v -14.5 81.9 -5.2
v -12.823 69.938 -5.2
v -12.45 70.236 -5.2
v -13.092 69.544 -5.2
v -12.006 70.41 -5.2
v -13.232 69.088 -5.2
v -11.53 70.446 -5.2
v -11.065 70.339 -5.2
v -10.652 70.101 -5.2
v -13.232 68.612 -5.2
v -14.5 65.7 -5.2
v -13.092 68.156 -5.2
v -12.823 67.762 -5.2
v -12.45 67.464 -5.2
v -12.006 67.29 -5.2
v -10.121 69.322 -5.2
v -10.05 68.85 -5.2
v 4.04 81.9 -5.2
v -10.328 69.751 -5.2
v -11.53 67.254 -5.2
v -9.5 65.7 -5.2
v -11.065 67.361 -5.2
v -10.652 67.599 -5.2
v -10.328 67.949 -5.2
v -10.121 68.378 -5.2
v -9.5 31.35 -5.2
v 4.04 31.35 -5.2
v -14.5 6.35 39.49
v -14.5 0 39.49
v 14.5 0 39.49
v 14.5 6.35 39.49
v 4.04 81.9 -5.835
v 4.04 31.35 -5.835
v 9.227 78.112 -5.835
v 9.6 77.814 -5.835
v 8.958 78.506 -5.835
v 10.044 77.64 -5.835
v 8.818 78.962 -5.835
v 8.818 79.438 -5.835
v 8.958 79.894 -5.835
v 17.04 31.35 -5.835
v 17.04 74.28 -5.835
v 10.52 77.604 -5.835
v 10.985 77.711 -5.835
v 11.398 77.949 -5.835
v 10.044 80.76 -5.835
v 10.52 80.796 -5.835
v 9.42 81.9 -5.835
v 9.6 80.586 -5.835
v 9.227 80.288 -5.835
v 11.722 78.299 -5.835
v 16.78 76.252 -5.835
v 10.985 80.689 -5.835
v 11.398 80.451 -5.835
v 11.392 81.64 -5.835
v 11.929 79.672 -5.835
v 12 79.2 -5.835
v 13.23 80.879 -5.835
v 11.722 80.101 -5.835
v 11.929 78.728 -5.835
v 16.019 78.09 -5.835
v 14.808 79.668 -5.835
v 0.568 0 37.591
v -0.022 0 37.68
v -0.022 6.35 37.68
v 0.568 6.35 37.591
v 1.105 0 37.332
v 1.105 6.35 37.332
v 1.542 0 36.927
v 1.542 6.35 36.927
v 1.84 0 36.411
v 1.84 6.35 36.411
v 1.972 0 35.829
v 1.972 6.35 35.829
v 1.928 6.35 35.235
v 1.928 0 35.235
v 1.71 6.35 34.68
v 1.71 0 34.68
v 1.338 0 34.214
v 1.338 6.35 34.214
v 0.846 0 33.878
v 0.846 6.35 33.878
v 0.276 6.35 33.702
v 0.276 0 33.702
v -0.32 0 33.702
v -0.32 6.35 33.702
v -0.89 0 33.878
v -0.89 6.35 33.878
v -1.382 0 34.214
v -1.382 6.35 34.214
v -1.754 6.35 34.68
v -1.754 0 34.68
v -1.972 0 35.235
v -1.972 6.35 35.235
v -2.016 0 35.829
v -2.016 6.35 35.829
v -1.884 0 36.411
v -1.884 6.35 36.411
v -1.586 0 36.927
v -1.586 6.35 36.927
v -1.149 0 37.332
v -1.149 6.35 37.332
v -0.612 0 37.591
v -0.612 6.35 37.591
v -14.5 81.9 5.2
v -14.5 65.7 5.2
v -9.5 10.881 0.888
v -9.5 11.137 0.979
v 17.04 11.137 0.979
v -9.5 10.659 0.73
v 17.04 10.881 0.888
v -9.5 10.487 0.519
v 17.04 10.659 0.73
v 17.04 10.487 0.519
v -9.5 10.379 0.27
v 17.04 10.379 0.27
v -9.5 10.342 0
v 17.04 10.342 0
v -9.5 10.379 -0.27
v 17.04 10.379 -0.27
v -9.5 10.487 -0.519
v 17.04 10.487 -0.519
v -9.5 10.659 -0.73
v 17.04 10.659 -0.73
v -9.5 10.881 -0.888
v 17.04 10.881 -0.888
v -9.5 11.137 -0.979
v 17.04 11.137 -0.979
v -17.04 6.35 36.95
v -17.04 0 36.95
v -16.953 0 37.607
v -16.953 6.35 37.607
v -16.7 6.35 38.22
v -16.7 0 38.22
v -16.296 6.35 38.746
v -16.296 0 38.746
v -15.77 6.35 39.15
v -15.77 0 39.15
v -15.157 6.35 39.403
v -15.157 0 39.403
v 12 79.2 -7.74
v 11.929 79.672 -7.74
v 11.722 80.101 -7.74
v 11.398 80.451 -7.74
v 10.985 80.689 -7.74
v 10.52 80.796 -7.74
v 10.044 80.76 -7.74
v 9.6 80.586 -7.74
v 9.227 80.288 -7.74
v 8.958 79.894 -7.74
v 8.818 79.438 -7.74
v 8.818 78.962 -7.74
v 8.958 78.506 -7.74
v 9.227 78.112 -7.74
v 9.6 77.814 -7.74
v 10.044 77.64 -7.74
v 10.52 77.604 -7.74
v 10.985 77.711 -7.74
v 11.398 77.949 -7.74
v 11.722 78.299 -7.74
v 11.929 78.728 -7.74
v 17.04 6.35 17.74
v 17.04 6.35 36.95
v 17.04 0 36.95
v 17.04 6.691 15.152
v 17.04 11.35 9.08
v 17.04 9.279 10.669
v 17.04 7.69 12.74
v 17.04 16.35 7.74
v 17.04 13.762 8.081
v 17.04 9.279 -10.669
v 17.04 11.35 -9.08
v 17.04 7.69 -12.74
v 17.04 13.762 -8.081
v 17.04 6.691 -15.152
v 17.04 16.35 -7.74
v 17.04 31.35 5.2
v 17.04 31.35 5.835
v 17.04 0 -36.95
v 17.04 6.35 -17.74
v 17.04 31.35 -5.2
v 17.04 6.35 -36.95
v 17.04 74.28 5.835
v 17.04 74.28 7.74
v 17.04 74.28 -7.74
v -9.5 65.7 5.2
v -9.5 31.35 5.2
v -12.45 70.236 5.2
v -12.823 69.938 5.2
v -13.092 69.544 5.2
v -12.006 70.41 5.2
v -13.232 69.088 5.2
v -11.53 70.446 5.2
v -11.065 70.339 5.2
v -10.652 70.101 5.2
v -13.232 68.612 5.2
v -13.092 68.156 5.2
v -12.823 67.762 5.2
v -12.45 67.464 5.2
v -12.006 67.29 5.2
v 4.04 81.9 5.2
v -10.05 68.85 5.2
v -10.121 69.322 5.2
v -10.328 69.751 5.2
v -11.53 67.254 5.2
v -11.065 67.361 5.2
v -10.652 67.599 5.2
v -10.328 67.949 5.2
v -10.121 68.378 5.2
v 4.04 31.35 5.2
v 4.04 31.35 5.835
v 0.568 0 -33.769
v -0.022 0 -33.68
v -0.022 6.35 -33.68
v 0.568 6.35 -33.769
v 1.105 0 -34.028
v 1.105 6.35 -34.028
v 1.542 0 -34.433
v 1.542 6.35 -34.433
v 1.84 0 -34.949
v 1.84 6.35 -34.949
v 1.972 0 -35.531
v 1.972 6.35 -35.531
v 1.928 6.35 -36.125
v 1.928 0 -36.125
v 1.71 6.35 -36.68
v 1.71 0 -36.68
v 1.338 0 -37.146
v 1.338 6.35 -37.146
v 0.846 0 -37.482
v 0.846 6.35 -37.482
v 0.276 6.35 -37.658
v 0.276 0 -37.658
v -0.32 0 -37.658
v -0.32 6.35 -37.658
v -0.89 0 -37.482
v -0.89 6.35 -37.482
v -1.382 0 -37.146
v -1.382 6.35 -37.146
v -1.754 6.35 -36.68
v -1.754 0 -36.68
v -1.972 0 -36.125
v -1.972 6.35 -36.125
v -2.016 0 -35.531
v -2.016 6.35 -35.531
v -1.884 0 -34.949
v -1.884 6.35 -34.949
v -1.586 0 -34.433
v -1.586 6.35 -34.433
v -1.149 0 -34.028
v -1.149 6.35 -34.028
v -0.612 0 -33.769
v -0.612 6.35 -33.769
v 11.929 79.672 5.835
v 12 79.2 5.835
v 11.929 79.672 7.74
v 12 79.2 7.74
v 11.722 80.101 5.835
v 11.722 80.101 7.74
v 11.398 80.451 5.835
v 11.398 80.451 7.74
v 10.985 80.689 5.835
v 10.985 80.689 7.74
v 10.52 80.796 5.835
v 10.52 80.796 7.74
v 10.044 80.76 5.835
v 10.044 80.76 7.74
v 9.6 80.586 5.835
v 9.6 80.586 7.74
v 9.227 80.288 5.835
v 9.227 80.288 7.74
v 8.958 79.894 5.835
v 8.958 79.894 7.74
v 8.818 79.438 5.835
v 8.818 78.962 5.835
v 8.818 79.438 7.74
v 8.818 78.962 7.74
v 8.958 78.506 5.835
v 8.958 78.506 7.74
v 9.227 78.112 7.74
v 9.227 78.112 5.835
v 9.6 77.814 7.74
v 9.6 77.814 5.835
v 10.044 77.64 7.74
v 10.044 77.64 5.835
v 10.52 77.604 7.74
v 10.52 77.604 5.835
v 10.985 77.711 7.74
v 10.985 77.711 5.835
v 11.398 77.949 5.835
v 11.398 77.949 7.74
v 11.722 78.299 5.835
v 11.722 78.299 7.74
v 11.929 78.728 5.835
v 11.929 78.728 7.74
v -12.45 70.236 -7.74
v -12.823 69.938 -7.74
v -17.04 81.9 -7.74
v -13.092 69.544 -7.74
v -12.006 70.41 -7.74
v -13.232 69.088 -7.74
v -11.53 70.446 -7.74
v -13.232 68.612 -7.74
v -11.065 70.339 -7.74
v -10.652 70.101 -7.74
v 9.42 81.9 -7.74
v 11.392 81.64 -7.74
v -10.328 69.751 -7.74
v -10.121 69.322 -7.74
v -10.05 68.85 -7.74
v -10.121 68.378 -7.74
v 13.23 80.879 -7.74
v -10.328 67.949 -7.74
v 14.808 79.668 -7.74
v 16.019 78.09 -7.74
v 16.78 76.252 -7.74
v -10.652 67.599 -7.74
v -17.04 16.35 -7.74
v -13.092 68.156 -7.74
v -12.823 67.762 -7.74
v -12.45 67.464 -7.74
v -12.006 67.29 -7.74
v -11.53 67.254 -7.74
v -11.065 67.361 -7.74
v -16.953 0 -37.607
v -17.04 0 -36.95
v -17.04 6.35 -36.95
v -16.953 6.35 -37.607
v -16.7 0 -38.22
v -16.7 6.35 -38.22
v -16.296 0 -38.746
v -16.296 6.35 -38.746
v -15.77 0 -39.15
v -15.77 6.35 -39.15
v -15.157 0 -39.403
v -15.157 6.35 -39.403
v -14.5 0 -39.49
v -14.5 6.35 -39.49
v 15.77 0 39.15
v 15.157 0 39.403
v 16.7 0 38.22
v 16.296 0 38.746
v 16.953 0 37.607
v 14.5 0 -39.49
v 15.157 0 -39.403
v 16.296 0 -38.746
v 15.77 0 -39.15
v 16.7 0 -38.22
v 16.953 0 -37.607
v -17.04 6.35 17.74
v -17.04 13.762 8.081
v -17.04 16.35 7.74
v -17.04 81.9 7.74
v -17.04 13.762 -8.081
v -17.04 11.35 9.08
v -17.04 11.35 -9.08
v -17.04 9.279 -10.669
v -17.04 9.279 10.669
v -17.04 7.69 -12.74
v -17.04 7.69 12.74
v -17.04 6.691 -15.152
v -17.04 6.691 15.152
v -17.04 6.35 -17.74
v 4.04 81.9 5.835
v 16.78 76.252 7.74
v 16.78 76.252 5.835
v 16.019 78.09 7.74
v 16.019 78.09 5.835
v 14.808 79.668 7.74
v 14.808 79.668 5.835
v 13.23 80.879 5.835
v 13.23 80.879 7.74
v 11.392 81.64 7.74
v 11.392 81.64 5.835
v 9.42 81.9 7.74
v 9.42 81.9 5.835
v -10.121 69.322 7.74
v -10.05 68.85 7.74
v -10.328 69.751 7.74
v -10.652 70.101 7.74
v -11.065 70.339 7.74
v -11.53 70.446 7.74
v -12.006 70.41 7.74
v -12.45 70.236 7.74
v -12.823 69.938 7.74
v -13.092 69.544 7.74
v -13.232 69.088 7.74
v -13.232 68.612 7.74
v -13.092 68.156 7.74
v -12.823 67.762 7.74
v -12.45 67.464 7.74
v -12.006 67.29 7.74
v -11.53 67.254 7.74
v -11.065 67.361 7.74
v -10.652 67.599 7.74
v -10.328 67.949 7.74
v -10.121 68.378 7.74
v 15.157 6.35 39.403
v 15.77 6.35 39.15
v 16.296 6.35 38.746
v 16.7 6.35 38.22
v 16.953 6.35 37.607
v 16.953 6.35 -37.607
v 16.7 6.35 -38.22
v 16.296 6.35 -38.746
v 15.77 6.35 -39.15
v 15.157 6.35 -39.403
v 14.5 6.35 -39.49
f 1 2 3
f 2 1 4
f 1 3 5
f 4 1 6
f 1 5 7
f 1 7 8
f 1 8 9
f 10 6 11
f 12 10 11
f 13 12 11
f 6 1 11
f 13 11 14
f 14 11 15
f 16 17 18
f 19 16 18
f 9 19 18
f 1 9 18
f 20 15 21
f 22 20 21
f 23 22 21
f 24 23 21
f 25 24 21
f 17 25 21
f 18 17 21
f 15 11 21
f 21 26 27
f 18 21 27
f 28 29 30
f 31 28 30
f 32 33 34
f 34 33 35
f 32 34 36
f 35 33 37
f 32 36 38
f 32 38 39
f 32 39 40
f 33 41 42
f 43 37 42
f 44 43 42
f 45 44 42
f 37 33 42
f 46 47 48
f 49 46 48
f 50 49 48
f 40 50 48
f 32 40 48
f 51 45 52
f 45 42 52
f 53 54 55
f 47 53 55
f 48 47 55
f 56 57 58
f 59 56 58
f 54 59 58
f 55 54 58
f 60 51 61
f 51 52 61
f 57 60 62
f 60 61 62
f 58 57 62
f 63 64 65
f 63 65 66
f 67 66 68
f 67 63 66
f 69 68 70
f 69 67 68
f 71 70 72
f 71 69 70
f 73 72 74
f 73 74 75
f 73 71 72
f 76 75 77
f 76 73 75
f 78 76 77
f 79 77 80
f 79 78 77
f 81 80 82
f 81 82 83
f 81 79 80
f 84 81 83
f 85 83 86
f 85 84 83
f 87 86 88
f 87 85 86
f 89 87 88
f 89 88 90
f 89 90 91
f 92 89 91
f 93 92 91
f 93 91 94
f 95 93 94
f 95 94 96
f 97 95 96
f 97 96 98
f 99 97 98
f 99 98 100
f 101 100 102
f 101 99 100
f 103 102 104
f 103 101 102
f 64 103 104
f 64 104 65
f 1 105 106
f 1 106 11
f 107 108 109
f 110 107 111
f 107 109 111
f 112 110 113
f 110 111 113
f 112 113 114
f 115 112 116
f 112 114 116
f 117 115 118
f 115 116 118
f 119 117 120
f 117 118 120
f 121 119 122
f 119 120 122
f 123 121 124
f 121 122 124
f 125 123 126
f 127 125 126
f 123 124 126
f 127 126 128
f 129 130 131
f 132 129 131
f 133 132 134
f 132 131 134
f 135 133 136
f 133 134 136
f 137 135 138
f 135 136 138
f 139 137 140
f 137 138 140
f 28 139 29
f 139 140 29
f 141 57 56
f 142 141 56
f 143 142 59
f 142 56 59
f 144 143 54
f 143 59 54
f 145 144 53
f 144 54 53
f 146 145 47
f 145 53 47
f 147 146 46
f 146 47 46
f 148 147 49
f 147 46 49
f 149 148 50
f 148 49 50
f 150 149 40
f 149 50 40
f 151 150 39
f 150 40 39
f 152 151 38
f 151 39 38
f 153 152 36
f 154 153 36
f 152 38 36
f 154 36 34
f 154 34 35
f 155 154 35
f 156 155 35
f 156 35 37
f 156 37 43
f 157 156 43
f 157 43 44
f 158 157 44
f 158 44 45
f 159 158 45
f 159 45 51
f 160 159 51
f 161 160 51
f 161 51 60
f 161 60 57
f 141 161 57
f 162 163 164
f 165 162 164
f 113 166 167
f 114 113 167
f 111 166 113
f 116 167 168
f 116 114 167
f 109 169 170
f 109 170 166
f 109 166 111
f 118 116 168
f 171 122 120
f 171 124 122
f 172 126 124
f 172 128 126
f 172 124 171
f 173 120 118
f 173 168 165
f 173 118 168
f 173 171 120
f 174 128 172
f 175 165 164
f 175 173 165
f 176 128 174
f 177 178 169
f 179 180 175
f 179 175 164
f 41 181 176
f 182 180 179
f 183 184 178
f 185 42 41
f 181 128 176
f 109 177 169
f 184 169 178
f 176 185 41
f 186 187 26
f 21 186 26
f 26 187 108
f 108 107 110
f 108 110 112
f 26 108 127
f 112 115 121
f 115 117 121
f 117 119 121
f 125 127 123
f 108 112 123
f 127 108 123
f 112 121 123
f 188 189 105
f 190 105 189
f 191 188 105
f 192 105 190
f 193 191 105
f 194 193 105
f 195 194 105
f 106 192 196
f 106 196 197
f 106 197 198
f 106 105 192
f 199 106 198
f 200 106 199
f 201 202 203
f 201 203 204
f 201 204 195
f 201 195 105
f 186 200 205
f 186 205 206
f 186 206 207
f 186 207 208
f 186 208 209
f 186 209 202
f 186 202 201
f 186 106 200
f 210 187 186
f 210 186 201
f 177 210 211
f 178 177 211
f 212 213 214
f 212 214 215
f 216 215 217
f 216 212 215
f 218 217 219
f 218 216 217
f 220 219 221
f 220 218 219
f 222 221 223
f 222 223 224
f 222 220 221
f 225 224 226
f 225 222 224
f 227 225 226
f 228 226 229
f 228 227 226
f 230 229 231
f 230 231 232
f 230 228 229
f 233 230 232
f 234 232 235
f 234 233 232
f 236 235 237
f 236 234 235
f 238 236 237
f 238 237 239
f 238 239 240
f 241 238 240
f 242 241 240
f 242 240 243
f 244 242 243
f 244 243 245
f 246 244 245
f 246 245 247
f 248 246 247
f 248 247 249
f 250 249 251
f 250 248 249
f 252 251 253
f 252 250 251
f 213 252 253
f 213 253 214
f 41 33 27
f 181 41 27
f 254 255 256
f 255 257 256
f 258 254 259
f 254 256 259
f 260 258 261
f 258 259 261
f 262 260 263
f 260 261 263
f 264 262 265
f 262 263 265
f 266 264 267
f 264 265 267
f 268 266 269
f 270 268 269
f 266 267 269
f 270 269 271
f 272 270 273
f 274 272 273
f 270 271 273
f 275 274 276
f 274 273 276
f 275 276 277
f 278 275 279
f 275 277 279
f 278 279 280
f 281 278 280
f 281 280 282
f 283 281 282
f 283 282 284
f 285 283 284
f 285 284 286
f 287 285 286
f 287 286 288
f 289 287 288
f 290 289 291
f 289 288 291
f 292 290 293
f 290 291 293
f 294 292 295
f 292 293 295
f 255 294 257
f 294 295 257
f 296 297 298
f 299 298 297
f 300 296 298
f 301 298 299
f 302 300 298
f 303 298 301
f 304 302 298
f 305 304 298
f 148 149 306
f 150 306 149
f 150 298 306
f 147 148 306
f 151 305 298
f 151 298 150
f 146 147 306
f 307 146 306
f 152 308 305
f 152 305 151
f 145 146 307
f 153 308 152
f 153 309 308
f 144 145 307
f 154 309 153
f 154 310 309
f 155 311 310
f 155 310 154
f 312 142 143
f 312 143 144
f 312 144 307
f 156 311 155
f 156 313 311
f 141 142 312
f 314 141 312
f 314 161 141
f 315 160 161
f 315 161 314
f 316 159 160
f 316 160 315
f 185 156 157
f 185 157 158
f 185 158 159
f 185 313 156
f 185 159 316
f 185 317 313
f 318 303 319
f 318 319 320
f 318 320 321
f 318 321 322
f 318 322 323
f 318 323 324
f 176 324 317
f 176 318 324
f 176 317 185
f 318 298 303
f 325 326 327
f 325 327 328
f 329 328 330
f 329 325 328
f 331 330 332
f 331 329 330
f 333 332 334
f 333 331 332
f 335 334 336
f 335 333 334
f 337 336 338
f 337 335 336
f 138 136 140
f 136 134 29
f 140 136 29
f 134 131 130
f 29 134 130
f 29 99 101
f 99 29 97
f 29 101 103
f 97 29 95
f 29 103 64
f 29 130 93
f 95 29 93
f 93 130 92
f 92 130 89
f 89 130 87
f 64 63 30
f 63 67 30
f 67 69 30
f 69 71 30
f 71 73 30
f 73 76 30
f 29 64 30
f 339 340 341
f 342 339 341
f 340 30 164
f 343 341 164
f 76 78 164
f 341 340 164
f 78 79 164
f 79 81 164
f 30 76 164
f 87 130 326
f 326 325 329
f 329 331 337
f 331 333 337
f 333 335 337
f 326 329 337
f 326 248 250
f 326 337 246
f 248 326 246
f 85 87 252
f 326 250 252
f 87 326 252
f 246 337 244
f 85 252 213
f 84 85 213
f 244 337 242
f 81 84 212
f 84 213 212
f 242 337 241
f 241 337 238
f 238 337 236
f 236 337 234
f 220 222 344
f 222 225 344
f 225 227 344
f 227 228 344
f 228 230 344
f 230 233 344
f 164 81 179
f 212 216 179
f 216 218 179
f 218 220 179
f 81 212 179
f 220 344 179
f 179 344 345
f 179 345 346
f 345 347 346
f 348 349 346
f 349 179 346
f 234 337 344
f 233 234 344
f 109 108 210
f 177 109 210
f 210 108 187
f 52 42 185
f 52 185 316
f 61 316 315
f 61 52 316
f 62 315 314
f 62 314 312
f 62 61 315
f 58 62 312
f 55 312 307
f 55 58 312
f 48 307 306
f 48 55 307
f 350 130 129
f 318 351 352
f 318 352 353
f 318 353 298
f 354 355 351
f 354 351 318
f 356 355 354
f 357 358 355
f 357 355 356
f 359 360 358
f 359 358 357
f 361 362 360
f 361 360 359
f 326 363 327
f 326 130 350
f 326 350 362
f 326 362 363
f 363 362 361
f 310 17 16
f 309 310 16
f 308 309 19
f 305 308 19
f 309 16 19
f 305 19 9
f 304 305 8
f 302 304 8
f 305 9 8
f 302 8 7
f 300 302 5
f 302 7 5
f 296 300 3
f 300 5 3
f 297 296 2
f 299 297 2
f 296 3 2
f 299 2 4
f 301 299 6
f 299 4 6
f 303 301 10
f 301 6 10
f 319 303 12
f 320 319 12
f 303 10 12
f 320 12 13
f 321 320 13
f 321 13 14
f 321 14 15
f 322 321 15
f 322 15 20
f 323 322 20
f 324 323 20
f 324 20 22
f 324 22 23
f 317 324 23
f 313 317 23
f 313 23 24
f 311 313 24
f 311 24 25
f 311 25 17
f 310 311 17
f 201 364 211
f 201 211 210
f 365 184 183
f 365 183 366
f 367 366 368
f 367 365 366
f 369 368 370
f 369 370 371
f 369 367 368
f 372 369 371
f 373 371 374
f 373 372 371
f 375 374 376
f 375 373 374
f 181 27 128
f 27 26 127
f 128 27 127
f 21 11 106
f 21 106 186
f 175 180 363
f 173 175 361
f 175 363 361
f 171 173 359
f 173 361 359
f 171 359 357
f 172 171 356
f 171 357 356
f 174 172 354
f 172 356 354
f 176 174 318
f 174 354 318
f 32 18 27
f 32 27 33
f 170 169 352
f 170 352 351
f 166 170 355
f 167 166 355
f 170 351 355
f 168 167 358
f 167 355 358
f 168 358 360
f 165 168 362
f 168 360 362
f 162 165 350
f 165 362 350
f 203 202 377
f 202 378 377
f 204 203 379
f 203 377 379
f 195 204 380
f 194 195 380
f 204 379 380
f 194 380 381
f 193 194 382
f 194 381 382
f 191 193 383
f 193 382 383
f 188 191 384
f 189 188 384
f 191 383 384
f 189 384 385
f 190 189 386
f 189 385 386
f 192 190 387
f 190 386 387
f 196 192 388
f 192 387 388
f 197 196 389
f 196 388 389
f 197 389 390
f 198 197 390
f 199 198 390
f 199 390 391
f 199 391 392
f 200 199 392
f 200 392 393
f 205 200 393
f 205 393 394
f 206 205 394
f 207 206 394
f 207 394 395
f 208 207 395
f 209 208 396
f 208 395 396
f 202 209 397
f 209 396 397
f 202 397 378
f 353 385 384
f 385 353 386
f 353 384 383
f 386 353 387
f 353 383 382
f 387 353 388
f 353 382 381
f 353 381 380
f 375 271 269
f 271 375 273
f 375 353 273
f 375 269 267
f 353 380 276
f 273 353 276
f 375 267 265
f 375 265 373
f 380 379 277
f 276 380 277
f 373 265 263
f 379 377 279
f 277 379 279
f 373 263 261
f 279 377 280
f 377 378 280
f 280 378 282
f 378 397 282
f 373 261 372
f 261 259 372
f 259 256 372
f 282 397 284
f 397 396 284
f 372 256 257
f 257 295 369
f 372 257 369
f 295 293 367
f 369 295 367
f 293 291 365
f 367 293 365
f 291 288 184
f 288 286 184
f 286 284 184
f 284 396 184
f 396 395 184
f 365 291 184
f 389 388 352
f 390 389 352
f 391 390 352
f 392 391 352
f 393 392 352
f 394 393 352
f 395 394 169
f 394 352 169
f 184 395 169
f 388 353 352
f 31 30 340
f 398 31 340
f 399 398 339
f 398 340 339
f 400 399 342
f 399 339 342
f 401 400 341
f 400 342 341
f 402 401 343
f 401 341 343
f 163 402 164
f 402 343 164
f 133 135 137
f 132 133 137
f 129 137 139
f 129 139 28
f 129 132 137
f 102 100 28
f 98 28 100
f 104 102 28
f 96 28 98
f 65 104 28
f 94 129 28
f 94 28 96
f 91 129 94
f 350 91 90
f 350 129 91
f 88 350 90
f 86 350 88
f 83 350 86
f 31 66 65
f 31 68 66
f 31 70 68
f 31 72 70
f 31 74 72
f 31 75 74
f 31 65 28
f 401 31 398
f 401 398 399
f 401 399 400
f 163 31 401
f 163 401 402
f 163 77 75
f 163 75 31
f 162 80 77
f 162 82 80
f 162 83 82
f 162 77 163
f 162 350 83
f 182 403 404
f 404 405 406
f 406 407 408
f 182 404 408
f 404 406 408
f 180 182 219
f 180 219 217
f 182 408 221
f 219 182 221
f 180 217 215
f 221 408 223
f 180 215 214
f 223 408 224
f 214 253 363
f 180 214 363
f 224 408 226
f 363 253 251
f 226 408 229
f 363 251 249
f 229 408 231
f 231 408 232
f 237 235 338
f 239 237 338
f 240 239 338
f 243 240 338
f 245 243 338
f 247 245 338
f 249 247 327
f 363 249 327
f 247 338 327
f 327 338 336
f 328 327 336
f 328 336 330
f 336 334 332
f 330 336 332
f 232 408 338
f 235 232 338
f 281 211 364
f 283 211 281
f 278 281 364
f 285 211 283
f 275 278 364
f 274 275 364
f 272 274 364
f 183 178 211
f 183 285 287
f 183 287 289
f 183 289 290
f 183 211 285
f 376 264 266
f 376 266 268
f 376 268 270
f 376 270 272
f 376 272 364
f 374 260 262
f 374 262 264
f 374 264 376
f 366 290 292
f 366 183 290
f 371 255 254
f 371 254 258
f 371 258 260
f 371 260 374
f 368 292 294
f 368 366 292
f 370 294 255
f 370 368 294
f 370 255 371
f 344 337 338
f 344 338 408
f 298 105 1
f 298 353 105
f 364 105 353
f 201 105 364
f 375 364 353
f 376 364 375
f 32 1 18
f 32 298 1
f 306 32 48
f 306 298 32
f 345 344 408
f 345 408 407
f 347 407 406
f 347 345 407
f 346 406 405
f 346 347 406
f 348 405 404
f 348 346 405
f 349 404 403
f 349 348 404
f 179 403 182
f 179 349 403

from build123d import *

# Parameters (mm, degrees)
SKETCH1_R                 = 1.999996
BOSS_EXTRUDE1_DEPTH       = 6.35
BOSS_EXTRUDE1_2_DEPTH     = 6.35
SKETCH1_3_W               = 34.08
SKETCH1_3_H               = 15.48
BOSS_EXTRUDE2_DEPTH       = 62.5
SKETCH2_W                 = 34.08
SKETCH2_H                 = 15.48
SKETCH2_W_2               = 29
SKETCH2_H_2               = 10.4
BOSS_EXTRUDE3_DEPTH       = 19.4
SKETCH3_W                 = 11.67
SKETCH3_H                 = 21.9
CUT_EXTRUDE1_DEPTH        = 13
SKETCH4_W                 = 5
SKETCH4_H                 = 10.4
BOSS_EXTRUDE4_DEPTH       = 3.2
CUT_EXTRUDE3_DEPTH        = 97.065834197
CUT_EXTRUDE3_DEPTH_BACK   = 97.065834197
F_3_0MM_DOWEL_HOLE1_D     = 3.2
F_3_0MM_DOWEL_HOLE1_DEPTH = 15.48
F_3_0MM_DOWEL_HOLE1_TIP   = 0.96137699
SKETCH10_W                = 13.54
SKETCH10_H                = 10.4
CUT_EXTRUDE5_DEPTH        = 2.5
FILLET1_R                 = 10
CUT_EXTRUDE6_DEPTH        = 53.65
BOSS_EXTRUDE5_DEPTH       = 26.54
FILLET3_R                 = 1


with BuildPart() as part:
    # Sketch1 → Boss-Extrude1 (new body)
    with BuildSketch(Plane(origin=(0, 0, 0), x_dir=(1, 0, 0), z_dir=(0, 1, 0))):
        with BuildLine():
            ThreePointArc((-17.04, 36.95), (-16.296051224, 38.746051224), (-14.5, 39.49))
            Line((-14.5, 39.49), (14.5, 39.49))
            ThreePointArc((14.5, 39.49), (16.296051224, 38.746051224), (17.04, 36.95))
            Line((17.04, 36.95), (17.04, 7.74))
            Line((17.04, 7.74), (-17.04, 7.74))
            Line((-17.04, 7.74), (-17.04, 36.95))
        make_face()
        with Locations(Location((-0.022, 35.68, 0), (0, 0, 270))):
            Circle(SKETCH1_R, mode=Mode.SUBTRACT)
    extrude(amount=BOSS_EXTRUDE1_DEPTH)



with BuildPart() as body_2:
    # Sketch1 → Boss-Extrude1 2 (new body)
    with BuildSketch(Plane(origin=(0, 0, 0), x_dir=(1, 0, 0), z_dir=(0, 1, 0))):
        with BuildLine():
            Line((-17.04, -7.74), (-17.04, -36.95))
            ThreePointArc((-17.04, -36.95), (-16.296051224, -38.746051224), (-14.5, -39.49))
            Line((-14.5, -39.49), (14.5, -39.49))
            ThreePointArc((14.5, -39.49), (16.296051224, -38.746051224), (17.04, -36.95))
            Line((17.04, -36.95), (17.04, -7.74))
            Line((17.04, -7.74), (-17.04, -7.74))
        make_face()
        with Locations(Location((-0.022, -35.68, 0), (0, 0, 270))):
            Circle(SKETCH1_R, mode=Mode.SUBTRACT)
    extrude(amount=BOSS_EXTRUDE1_2_DEPTH)


with BuildPart() as part_1:
    add(part.part)

    add(body_2.part)  # Boss-Extrude2 merges body 2
    # Sketch1<3> → Boss-Extrude2 (add)
    with BuildSketch(Plane(origin=(0, 0, 0), x_dir=(1, 0, 0), z_dir=(0, 1, 0))):
        Rectangle(SKETCH1_3_W, SKETCH1_3_H)
    extrude(amount=BOSS_EXTRUDE2_DEPTH)

    # Sketch2 → Boss-Extrude3 (add)
    with BuildSketch(Plane(origin=(0, 62.5, 0), x_dir=(1, 0, 0), z_dir=(0, 1, 0))):
        Rectangle(SKETCH2_W, SKETCH2_H)
        Rectangle(SKETCH2_W_2, SKETCH2_H_2, mode=Mode.SUBTRACT)
    extrude(amount=BOSS_EXTRUDE3_DEPTH)

    # Sketch3 → Cut-Extrude1 (cut)
    with BuildSketch(Plane(origin=(17.04, 0, 0), x_dir=(0, 0, -1), z_dir=(1, 0, 0))):
        with Locations((0, 70.95)):
            Rectangle(SKETCH3_W, SKETCH3_H)
    extrude(amount=-CUT_EXTRUDE1_DEPTH, mode=Mode.SUBTRACT)

    # Sketch4 → Boss-Extrude4 (add)
    with BuildSketch(Plane(origin=(0, 62.5, 0), x_dir=(1, 0, 0), z_dir=(0, 1, 0))):
        with Locations((-12, 0)):
            Rectangle(SKETCH4_W, SKETCH4_H)
    extrude(amount=BOSS_EXTRUDE4_DEPTH)

    # Sketch5 → Cut-Extrude3 (cut, two sides: drawn at the far end of the back side and taken through both)
    with BuildSketch(Plane(origin=(0, 0, -7.74), x_dir=(-1, 0, 0), z_dir=(0, 0, -1)).offset(-CUT_EXTRUDE3_DEPTH_BACK)):
        with BuildLine():
            Line((-17.04, 81.9), (-17.04, 74.28))
            ThreePointArc((-17.04, 74.28), (-14.808153673, 79.668153673), (-9.42, 81.9))
            Line((-9.42, 81.9), (-17.04, 81.9))
        make_face()
    extrude(amount=CUT_EXTRUDE3_DEPTH + CUT_EXTRUDE3_DEPTH_BACK, mode=Mode.SUBTRACT)

    # Ø3.0mm Dowel Hole1
    with Locations(Plane(origin=(0, 0, -7.74), x_dir=(-1, 0, 0), z_dir=(0, 0, -1))):
        with Locations((11.650000349, 68.85), (-10.400000349, 79.2)):
            Hole(F_3_0MM_DOWEL_HOLE1_D / 2, depth=F_3_0MM_DOWEL_HOLE1_DEPTH)
            with Locations((0, 0, -(F_3_0MM_DOWEL_HOLE1_DEPTH + F_3_0MM_DOWEL_HOLE1_TIP / 2))):  # 118° drill point
                Cone(0, F_3_0MM_DOWEL_HOLE1_D / 2, F_3_0MM_DOWEL_HOLE1_TIP, mode=Mode.SUBTRACT)

    # Sketch10 → Cut-Extrude5 (cut)
    with BuildSketch(Plane(origin=(0, 62.5, 0), x_dir=(1, 0, 0), z_dir=(0, 1, 0))):
        with Locations((-2.73, 0)):
            Rectangle(SKETCH10_W, SKETCH10_H)
    extrude(amount=-CUT_EXTRUDE5_DEPTH, mode=Mode.SUBTRACT)

    # Fillet1
    fillet1_edges = [part_1.edges().sort_by_distance(p)[0] for p in [
        (0, 6.35, -7.74),
        (0, 6.35, 7.74),
    ]]
    fillet(fillet1_edges, radius=FILLET1_R)

    # Sketch11 → Cut-Extrude6 (cut)
    with BuildSketch(Plane(origin=(0, 60, 0), x_dir=(1, 0, 0), z_dir=(0, 1, 0))):
        Polygon((17.04, -5.835), (17.04, 5.835), (4.04, 5.835), (4.04, 5.2), (-9.5, 5.2), (-9.5, -5.2), (4.04, -5.2), (4.04, -5.835), align=None)
    extrude(amount=-CUT_EXTRUDE6_DEPTH, mode=Mode.SUBTRACT)

    # Sketch12 → Boss-Extrude5 (add)
    with BuildSketch(Plane(origin=(-9.5, 0, 0), x_dir=(0, 0, -1), z_dir=(1, 0, 0))):
        Polygon((-5.2, 31.35), (-5.835, 31.35), (-5.835, 6.35), (0, 6.35), (5.835, 6.35), (5.835, 31.35), (5.2, 31.35), (0, 6.45), align=None)
    extrude(amount=BOSS_EXTRUDE5_DEPTH)

    # Fillet3
    fillet3_edges = [part_1.edges().sort_by_distance(p)[0] for p in [
        (3.77, 6.45, 0),
    ]]
    fillet(fillet3_edges, radius=FILLET3_R)


solid = part_1.part
